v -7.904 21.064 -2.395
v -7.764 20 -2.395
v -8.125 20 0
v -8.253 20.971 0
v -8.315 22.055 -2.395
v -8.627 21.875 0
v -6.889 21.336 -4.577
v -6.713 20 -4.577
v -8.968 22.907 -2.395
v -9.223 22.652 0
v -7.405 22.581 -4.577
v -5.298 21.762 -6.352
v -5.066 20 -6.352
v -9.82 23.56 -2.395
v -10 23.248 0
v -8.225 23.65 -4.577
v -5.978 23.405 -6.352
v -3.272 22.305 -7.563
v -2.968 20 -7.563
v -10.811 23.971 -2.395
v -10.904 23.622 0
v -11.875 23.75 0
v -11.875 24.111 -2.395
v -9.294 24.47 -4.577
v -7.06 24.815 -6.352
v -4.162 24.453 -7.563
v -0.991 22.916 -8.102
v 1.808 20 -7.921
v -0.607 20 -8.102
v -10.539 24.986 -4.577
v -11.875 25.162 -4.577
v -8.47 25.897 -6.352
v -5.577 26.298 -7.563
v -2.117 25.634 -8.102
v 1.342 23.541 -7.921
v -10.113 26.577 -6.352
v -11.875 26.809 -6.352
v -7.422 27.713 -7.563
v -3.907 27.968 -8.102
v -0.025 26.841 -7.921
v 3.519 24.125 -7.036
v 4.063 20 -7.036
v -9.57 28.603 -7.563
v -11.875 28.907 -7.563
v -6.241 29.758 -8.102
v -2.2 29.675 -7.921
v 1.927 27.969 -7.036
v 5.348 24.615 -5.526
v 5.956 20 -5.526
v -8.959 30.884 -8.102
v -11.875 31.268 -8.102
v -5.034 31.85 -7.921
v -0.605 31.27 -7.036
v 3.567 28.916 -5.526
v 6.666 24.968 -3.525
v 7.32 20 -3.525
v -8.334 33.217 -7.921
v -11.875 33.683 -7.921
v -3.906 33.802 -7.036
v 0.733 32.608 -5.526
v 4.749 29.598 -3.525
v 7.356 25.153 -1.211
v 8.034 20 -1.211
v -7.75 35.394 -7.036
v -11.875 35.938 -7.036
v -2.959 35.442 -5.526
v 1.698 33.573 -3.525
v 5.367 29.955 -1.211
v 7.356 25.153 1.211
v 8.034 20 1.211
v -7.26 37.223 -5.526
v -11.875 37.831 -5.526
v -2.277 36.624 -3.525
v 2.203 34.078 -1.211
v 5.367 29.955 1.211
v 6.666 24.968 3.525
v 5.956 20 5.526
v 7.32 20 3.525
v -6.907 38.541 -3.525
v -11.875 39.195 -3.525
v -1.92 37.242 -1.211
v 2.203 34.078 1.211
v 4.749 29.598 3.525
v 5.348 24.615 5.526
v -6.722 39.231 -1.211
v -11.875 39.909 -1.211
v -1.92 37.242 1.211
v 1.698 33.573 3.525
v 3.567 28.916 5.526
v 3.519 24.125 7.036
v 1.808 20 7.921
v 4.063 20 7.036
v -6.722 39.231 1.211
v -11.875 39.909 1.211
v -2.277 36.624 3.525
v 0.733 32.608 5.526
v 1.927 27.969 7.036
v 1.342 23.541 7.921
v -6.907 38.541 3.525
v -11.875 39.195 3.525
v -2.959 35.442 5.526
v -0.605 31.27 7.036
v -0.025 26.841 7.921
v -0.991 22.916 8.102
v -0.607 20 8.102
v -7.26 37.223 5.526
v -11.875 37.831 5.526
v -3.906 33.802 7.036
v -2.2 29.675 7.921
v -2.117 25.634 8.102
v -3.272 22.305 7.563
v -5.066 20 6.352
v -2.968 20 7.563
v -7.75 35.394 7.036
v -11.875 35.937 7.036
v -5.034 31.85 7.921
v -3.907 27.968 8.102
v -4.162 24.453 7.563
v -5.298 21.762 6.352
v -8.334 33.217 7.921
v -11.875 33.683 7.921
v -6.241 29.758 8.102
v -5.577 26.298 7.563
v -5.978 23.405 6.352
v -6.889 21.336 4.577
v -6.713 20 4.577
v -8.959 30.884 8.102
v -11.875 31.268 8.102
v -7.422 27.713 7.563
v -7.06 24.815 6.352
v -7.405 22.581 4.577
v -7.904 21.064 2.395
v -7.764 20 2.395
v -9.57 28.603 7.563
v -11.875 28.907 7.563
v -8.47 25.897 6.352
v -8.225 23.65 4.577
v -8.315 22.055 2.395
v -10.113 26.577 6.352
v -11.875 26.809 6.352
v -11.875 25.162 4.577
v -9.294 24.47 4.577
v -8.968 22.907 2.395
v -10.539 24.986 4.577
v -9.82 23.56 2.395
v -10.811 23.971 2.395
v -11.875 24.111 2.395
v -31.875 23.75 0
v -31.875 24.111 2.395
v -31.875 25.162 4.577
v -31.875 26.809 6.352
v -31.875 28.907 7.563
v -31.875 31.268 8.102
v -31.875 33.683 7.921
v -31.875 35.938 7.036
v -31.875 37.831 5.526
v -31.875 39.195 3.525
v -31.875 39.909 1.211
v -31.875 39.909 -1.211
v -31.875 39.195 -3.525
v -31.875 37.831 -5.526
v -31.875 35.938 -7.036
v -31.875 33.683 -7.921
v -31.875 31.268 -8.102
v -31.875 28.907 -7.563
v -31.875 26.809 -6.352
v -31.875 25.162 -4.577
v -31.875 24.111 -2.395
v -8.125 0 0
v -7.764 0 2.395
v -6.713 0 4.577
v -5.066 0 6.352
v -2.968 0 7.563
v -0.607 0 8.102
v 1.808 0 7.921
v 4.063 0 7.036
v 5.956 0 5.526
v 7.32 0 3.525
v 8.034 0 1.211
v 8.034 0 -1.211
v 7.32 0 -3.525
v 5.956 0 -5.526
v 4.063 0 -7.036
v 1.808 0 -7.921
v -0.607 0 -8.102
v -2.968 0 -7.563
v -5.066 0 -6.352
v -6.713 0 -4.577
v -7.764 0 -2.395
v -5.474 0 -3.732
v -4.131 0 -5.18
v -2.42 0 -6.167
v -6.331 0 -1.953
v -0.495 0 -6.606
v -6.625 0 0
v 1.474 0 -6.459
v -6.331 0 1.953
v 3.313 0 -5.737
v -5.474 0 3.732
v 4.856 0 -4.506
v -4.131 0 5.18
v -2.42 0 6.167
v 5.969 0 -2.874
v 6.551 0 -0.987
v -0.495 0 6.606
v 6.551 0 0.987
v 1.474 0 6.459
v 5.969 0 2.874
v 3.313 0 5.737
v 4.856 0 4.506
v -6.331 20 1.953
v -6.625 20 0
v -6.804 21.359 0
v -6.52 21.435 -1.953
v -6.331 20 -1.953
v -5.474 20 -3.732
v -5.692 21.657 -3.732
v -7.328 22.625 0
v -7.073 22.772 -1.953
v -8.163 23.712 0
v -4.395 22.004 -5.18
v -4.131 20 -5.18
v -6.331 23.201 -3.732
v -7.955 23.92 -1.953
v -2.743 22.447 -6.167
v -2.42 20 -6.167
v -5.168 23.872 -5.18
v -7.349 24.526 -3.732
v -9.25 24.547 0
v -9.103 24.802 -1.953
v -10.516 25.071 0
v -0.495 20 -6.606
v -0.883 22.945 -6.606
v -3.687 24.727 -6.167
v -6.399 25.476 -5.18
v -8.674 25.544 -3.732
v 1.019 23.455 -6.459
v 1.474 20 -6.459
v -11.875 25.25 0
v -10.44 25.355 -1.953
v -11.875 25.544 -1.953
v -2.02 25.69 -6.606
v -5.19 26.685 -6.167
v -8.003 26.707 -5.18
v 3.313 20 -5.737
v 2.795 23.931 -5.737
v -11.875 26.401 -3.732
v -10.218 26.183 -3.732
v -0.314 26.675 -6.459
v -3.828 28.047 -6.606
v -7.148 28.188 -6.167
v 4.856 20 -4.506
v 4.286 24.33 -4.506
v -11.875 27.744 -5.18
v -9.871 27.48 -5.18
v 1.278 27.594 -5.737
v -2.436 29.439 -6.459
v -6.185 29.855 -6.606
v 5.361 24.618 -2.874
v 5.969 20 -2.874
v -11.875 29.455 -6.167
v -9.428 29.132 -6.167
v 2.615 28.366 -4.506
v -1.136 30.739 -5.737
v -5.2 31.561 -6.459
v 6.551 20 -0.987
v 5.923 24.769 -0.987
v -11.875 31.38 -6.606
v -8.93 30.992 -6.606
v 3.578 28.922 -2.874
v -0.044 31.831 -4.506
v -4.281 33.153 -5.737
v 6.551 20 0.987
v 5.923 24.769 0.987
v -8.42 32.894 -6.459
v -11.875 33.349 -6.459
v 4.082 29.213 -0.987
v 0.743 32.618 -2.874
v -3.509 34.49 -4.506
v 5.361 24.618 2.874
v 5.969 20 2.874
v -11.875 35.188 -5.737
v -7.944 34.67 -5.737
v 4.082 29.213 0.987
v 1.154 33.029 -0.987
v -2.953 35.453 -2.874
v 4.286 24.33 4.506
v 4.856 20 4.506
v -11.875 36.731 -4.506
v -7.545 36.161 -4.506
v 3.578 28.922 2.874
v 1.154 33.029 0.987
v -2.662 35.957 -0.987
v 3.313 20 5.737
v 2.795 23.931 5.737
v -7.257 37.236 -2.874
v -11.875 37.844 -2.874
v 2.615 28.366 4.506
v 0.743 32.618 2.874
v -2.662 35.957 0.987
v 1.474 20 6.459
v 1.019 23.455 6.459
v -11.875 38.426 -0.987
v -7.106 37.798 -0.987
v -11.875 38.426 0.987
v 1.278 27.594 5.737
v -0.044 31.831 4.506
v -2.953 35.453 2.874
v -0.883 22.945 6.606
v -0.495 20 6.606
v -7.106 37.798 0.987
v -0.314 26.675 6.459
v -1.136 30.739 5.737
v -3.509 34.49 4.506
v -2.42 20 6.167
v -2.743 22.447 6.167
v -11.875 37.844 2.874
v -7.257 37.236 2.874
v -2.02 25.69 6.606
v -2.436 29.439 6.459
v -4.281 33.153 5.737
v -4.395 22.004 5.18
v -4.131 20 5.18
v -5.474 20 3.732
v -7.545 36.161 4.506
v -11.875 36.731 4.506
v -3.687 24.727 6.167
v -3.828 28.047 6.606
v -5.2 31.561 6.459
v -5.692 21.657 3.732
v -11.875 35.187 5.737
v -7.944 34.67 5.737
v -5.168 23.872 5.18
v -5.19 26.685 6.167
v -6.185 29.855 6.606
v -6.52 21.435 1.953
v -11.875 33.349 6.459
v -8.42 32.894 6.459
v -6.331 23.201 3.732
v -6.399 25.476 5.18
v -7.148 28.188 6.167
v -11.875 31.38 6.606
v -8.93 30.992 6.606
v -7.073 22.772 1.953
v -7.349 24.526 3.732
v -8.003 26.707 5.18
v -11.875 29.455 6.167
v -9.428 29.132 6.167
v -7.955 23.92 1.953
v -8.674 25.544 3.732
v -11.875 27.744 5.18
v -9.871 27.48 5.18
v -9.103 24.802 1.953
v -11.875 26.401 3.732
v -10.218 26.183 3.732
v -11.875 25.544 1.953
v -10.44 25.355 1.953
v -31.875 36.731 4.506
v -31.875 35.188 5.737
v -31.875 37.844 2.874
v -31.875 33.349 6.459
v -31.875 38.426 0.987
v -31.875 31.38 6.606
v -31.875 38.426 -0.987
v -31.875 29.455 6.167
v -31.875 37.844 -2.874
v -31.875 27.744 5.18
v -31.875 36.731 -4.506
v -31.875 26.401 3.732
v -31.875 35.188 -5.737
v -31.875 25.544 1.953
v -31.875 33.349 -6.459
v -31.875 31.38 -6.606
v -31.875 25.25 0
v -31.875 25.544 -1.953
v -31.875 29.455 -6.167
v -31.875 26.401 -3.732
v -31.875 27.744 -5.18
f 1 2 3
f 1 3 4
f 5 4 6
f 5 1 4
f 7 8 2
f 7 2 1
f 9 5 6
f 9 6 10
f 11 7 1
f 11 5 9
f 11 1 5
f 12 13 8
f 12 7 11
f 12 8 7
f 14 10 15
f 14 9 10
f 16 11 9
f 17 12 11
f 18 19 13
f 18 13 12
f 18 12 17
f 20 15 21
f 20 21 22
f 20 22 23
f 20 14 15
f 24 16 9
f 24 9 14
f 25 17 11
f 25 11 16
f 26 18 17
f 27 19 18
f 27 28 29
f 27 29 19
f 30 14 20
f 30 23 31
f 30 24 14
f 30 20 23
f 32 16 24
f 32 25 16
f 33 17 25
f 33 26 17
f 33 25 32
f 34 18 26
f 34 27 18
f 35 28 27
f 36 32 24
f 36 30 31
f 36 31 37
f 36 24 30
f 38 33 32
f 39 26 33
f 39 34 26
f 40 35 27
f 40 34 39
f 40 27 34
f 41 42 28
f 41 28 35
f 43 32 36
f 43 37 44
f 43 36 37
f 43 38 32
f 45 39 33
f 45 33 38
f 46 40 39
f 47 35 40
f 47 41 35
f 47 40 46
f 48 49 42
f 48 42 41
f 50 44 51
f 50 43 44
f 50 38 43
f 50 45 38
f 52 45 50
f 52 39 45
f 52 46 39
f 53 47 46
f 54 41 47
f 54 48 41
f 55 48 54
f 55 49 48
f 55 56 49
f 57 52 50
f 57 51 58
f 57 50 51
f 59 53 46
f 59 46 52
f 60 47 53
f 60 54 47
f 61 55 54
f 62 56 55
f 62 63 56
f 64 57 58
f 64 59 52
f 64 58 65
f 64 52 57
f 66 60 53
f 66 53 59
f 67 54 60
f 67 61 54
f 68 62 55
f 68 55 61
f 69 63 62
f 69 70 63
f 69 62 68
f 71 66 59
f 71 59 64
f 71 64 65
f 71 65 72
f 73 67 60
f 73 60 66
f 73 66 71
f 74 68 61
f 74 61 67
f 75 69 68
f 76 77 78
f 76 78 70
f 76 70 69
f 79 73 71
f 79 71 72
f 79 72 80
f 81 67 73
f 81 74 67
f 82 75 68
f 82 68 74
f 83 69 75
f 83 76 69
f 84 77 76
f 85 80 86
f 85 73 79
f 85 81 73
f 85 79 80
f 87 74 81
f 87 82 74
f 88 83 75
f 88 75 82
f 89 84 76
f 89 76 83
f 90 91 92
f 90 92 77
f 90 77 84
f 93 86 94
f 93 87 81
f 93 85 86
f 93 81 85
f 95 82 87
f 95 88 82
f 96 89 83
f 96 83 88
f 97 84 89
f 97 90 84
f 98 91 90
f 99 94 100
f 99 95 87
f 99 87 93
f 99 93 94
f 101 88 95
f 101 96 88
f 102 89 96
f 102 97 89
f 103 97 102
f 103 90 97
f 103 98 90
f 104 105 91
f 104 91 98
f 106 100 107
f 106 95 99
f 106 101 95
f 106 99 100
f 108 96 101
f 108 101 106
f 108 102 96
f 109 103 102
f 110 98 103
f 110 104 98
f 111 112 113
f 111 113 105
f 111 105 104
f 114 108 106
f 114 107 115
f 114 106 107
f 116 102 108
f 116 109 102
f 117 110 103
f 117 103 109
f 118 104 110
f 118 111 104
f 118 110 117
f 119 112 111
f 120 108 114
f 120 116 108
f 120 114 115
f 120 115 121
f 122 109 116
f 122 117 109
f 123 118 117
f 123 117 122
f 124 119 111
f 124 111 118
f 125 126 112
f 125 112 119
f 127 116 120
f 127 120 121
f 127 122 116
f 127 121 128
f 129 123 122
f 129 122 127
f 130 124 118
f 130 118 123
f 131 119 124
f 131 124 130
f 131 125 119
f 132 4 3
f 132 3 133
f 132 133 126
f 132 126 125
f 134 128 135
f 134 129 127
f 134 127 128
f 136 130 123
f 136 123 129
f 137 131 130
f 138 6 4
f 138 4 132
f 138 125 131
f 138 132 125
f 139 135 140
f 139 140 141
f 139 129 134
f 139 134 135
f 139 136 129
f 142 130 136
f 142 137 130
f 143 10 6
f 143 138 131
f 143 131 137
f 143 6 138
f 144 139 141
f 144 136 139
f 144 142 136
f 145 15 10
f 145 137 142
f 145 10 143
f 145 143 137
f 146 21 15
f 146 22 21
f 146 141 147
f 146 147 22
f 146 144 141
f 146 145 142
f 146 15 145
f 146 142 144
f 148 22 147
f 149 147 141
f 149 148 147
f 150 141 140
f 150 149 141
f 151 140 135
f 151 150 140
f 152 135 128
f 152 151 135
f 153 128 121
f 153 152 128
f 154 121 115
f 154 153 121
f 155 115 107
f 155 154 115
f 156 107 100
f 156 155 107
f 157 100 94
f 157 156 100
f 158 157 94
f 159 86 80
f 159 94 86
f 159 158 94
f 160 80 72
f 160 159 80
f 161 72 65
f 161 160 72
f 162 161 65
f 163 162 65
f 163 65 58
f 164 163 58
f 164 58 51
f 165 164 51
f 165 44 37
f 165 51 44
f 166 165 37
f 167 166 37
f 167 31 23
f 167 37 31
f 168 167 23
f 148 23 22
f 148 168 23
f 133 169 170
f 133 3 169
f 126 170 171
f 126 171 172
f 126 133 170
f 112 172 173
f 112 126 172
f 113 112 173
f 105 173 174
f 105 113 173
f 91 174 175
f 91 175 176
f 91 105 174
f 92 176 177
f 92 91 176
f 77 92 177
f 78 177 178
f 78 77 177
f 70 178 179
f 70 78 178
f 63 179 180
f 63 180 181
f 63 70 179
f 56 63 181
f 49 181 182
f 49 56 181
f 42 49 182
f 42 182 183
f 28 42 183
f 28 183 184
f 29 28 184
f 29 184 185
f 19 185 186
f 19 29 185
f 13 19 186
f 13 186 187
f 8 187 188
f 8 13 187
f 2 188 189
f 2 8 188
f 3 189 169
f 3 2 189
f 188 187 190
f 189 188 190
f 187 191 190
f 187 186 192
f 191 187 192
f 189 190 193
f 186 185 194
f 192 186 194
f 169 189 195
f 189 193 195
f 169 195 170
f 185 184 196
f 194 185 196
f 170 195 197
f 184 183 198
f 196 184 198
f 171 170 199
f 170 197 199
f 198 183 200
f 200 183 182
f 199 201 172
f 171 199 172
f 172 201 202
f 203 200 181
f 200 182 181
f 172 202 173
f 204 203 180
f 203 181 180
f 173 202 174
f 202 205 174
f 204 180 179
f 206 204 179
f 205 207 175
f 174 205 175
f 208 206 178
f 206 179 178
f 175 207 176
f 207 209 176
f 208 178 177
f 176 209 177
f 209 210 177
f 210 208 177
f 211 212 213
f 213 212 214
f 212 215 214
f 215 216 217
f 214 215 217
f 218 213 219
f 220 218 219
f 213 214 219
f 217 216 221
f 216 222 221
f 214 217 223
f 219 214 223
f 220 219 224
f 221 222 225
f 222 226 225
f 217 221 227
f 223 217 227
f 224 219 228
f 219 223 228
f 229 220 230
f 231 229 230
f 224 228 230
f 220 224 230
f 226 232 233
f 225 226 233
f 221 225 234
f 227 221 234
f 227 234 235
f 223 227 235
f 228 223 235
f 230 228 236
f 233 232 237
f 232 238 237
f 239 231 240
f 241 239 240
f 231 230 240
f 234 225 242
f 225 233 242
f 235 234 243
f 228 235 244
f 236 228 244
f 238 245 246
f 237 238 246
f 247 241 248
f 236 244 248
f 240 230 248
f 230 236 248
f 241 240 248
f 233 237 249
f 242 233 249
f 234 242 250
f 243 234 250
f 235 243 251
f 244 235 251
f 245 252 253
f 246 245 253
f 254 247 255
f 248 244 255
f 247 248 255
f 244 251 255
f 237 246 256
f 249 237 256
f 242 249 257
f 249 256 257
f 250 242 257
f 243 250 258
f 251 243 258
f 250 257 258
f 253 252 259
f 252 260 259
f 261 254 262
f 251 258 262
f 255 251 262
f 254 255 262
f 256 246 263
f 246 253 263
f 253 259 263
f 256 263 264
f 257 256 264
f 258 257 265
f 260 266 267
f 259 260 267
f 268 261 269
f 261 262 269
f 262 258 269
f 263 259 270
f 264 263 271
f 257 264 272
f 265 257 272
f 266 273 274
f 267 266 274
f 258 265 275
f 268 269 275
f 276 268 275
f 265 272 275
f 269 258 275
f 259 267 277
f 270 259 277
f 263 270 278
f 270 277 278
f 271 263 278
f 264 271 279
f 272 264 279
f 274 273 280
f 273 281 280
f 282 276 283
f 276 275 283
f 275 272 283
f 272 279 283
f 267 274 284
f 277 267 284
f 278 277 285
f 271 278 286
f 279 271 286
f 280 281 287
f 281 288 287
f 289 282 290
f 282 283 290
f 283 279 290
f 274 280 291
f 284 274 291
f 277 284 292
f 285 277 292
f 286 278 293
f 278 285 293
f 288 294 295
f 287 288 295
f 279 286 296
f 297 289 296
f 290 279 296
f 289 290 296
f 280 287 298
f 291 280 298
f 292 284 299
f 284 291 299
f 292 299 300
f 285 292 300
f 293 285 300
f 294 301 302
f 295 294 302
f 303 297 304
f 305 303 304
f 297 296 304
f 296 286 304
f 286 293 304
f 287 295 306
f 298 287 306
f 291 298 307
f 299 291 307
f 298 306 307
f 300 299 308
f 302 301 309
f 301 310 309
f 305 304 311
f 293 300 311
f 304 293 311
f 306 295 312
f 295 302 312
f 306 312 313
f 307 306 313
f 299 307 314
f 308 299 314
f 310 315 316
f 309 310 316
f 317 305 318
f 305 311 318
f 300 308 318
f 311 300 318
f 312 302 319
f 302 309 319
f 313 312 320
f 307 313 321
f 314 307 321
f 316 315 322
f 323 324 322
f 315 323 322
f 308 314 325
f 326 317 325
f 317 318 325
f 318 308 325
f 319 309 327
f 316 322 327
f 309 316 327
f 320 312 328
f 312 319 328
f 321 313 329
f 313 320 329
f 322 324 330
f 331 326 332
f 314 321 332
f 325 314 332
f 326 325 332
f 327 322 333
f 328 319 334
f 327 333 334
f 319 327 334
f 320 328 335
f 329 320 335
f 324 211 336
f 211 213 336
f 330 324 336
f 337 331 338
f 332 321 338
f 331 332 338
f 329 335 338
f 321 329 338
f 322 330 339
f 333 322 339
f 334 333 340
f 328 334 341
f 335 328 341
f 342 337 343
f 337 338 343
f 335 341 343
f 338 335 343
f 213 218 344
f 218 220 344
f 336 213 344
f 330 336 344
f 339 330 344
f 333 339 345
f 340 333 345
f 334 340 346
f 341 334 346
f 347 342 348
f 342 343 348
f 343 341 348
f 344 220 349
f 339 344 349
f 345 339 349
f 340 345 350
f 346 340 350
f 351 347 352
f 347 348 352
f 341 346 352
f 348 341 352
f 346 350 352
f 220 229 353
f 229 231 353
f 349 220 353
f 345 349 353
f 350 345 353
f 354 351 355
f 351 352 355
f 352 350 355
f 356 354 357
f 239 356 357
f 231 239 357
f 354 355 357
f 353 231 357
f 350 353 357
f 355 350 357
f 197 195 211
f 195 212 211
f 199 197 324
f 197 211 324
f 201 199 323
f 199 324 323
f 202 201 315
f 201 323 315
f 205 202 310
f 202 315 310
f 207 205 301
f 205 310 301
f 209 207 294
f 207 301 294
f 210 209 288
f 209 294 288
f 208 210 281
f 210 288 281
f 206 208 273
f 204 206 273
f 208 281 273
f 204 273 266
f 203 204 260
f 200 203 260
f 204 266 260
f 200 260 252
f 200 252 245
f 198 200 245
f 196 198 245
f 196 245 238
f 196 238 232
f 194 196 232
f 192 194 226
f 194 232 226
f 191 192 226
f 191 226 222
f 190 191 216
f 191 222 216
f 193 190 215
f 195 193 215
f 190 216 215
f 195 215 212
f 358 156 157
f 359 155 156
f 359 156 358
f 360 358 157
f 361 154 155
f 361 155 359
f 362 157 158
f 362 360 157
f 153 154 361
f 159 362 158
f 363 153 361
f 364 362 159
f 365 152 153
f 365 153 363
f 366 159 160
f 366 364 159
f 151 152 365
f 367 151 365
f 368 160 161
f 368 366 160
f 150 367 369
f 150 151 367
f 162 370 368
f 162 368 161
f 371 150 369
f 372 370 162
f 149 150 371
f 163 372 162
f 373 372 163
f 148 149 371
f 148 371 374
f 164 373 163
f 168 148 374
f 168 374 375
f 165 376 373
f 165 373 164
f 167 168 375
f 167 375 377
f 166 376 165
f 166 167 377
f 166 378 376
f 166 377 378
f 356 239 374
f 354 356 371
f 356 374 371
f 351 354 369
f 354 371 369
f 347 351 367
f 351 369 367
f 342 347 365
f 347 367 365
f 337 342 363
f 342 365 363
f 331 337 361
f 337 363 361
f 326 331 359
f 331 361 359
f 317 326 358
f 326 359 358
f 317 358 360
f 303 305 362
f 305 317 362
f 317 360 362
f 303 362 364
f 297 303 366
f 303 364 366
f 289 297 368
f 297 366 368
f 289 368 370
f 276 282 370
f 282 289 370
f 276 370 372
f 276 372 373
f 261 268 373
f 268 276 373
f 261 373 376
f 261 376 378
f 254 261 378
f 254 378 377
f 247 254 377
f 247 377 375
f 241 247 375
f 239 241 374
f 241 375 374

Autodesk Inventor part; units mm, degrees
ref_plane "YZ Plane" through (0, 0, 0) normal (1, 0, 0) x (0, 1, 0)
ref_plane "XZ Plane" through (0, 0, 0) normal (0, 1, 0) x (-1, 0, 0)
ref_plane "XY Plane" through (0, 0, 0) normal (0, 0, 1) x (1, 0, 0)
sketch "Sketch1" plane through (0, 0, 0) normal (0, 1, 0) x (-1, 0, 0)
  circle A0 centre (0, 0) radius 8.125
  circle A1 centre (0, 0) radius 6.625
  dimension "d0" = 16.25
  dimension "d1" = 13.25
sketch "Sketch3" plane through (0, 0, 0) normal (0, 0, 1) x (1, 0, 0)
  line L0 (8.125, 0) -> (8.125, 20)
  line L1 (8.125, 0) -> (28.125, 0) construction
  arc A0 (8.125, 20) -> (-11.875, 40) centre (-11.875, 20) ccw
  line L2 (-11.875, 40) -> (-31.875, 40)
  point P0 (0, 0)
  dimension "d5" = 20
  dimension "d6" = 90
  dimension "d7" = 20
  dimension "d10" = 20
sweep "Sweep1" add profiles "Sketch1" path "Sketch3"
properties part number "Effector Wire Conduit"
